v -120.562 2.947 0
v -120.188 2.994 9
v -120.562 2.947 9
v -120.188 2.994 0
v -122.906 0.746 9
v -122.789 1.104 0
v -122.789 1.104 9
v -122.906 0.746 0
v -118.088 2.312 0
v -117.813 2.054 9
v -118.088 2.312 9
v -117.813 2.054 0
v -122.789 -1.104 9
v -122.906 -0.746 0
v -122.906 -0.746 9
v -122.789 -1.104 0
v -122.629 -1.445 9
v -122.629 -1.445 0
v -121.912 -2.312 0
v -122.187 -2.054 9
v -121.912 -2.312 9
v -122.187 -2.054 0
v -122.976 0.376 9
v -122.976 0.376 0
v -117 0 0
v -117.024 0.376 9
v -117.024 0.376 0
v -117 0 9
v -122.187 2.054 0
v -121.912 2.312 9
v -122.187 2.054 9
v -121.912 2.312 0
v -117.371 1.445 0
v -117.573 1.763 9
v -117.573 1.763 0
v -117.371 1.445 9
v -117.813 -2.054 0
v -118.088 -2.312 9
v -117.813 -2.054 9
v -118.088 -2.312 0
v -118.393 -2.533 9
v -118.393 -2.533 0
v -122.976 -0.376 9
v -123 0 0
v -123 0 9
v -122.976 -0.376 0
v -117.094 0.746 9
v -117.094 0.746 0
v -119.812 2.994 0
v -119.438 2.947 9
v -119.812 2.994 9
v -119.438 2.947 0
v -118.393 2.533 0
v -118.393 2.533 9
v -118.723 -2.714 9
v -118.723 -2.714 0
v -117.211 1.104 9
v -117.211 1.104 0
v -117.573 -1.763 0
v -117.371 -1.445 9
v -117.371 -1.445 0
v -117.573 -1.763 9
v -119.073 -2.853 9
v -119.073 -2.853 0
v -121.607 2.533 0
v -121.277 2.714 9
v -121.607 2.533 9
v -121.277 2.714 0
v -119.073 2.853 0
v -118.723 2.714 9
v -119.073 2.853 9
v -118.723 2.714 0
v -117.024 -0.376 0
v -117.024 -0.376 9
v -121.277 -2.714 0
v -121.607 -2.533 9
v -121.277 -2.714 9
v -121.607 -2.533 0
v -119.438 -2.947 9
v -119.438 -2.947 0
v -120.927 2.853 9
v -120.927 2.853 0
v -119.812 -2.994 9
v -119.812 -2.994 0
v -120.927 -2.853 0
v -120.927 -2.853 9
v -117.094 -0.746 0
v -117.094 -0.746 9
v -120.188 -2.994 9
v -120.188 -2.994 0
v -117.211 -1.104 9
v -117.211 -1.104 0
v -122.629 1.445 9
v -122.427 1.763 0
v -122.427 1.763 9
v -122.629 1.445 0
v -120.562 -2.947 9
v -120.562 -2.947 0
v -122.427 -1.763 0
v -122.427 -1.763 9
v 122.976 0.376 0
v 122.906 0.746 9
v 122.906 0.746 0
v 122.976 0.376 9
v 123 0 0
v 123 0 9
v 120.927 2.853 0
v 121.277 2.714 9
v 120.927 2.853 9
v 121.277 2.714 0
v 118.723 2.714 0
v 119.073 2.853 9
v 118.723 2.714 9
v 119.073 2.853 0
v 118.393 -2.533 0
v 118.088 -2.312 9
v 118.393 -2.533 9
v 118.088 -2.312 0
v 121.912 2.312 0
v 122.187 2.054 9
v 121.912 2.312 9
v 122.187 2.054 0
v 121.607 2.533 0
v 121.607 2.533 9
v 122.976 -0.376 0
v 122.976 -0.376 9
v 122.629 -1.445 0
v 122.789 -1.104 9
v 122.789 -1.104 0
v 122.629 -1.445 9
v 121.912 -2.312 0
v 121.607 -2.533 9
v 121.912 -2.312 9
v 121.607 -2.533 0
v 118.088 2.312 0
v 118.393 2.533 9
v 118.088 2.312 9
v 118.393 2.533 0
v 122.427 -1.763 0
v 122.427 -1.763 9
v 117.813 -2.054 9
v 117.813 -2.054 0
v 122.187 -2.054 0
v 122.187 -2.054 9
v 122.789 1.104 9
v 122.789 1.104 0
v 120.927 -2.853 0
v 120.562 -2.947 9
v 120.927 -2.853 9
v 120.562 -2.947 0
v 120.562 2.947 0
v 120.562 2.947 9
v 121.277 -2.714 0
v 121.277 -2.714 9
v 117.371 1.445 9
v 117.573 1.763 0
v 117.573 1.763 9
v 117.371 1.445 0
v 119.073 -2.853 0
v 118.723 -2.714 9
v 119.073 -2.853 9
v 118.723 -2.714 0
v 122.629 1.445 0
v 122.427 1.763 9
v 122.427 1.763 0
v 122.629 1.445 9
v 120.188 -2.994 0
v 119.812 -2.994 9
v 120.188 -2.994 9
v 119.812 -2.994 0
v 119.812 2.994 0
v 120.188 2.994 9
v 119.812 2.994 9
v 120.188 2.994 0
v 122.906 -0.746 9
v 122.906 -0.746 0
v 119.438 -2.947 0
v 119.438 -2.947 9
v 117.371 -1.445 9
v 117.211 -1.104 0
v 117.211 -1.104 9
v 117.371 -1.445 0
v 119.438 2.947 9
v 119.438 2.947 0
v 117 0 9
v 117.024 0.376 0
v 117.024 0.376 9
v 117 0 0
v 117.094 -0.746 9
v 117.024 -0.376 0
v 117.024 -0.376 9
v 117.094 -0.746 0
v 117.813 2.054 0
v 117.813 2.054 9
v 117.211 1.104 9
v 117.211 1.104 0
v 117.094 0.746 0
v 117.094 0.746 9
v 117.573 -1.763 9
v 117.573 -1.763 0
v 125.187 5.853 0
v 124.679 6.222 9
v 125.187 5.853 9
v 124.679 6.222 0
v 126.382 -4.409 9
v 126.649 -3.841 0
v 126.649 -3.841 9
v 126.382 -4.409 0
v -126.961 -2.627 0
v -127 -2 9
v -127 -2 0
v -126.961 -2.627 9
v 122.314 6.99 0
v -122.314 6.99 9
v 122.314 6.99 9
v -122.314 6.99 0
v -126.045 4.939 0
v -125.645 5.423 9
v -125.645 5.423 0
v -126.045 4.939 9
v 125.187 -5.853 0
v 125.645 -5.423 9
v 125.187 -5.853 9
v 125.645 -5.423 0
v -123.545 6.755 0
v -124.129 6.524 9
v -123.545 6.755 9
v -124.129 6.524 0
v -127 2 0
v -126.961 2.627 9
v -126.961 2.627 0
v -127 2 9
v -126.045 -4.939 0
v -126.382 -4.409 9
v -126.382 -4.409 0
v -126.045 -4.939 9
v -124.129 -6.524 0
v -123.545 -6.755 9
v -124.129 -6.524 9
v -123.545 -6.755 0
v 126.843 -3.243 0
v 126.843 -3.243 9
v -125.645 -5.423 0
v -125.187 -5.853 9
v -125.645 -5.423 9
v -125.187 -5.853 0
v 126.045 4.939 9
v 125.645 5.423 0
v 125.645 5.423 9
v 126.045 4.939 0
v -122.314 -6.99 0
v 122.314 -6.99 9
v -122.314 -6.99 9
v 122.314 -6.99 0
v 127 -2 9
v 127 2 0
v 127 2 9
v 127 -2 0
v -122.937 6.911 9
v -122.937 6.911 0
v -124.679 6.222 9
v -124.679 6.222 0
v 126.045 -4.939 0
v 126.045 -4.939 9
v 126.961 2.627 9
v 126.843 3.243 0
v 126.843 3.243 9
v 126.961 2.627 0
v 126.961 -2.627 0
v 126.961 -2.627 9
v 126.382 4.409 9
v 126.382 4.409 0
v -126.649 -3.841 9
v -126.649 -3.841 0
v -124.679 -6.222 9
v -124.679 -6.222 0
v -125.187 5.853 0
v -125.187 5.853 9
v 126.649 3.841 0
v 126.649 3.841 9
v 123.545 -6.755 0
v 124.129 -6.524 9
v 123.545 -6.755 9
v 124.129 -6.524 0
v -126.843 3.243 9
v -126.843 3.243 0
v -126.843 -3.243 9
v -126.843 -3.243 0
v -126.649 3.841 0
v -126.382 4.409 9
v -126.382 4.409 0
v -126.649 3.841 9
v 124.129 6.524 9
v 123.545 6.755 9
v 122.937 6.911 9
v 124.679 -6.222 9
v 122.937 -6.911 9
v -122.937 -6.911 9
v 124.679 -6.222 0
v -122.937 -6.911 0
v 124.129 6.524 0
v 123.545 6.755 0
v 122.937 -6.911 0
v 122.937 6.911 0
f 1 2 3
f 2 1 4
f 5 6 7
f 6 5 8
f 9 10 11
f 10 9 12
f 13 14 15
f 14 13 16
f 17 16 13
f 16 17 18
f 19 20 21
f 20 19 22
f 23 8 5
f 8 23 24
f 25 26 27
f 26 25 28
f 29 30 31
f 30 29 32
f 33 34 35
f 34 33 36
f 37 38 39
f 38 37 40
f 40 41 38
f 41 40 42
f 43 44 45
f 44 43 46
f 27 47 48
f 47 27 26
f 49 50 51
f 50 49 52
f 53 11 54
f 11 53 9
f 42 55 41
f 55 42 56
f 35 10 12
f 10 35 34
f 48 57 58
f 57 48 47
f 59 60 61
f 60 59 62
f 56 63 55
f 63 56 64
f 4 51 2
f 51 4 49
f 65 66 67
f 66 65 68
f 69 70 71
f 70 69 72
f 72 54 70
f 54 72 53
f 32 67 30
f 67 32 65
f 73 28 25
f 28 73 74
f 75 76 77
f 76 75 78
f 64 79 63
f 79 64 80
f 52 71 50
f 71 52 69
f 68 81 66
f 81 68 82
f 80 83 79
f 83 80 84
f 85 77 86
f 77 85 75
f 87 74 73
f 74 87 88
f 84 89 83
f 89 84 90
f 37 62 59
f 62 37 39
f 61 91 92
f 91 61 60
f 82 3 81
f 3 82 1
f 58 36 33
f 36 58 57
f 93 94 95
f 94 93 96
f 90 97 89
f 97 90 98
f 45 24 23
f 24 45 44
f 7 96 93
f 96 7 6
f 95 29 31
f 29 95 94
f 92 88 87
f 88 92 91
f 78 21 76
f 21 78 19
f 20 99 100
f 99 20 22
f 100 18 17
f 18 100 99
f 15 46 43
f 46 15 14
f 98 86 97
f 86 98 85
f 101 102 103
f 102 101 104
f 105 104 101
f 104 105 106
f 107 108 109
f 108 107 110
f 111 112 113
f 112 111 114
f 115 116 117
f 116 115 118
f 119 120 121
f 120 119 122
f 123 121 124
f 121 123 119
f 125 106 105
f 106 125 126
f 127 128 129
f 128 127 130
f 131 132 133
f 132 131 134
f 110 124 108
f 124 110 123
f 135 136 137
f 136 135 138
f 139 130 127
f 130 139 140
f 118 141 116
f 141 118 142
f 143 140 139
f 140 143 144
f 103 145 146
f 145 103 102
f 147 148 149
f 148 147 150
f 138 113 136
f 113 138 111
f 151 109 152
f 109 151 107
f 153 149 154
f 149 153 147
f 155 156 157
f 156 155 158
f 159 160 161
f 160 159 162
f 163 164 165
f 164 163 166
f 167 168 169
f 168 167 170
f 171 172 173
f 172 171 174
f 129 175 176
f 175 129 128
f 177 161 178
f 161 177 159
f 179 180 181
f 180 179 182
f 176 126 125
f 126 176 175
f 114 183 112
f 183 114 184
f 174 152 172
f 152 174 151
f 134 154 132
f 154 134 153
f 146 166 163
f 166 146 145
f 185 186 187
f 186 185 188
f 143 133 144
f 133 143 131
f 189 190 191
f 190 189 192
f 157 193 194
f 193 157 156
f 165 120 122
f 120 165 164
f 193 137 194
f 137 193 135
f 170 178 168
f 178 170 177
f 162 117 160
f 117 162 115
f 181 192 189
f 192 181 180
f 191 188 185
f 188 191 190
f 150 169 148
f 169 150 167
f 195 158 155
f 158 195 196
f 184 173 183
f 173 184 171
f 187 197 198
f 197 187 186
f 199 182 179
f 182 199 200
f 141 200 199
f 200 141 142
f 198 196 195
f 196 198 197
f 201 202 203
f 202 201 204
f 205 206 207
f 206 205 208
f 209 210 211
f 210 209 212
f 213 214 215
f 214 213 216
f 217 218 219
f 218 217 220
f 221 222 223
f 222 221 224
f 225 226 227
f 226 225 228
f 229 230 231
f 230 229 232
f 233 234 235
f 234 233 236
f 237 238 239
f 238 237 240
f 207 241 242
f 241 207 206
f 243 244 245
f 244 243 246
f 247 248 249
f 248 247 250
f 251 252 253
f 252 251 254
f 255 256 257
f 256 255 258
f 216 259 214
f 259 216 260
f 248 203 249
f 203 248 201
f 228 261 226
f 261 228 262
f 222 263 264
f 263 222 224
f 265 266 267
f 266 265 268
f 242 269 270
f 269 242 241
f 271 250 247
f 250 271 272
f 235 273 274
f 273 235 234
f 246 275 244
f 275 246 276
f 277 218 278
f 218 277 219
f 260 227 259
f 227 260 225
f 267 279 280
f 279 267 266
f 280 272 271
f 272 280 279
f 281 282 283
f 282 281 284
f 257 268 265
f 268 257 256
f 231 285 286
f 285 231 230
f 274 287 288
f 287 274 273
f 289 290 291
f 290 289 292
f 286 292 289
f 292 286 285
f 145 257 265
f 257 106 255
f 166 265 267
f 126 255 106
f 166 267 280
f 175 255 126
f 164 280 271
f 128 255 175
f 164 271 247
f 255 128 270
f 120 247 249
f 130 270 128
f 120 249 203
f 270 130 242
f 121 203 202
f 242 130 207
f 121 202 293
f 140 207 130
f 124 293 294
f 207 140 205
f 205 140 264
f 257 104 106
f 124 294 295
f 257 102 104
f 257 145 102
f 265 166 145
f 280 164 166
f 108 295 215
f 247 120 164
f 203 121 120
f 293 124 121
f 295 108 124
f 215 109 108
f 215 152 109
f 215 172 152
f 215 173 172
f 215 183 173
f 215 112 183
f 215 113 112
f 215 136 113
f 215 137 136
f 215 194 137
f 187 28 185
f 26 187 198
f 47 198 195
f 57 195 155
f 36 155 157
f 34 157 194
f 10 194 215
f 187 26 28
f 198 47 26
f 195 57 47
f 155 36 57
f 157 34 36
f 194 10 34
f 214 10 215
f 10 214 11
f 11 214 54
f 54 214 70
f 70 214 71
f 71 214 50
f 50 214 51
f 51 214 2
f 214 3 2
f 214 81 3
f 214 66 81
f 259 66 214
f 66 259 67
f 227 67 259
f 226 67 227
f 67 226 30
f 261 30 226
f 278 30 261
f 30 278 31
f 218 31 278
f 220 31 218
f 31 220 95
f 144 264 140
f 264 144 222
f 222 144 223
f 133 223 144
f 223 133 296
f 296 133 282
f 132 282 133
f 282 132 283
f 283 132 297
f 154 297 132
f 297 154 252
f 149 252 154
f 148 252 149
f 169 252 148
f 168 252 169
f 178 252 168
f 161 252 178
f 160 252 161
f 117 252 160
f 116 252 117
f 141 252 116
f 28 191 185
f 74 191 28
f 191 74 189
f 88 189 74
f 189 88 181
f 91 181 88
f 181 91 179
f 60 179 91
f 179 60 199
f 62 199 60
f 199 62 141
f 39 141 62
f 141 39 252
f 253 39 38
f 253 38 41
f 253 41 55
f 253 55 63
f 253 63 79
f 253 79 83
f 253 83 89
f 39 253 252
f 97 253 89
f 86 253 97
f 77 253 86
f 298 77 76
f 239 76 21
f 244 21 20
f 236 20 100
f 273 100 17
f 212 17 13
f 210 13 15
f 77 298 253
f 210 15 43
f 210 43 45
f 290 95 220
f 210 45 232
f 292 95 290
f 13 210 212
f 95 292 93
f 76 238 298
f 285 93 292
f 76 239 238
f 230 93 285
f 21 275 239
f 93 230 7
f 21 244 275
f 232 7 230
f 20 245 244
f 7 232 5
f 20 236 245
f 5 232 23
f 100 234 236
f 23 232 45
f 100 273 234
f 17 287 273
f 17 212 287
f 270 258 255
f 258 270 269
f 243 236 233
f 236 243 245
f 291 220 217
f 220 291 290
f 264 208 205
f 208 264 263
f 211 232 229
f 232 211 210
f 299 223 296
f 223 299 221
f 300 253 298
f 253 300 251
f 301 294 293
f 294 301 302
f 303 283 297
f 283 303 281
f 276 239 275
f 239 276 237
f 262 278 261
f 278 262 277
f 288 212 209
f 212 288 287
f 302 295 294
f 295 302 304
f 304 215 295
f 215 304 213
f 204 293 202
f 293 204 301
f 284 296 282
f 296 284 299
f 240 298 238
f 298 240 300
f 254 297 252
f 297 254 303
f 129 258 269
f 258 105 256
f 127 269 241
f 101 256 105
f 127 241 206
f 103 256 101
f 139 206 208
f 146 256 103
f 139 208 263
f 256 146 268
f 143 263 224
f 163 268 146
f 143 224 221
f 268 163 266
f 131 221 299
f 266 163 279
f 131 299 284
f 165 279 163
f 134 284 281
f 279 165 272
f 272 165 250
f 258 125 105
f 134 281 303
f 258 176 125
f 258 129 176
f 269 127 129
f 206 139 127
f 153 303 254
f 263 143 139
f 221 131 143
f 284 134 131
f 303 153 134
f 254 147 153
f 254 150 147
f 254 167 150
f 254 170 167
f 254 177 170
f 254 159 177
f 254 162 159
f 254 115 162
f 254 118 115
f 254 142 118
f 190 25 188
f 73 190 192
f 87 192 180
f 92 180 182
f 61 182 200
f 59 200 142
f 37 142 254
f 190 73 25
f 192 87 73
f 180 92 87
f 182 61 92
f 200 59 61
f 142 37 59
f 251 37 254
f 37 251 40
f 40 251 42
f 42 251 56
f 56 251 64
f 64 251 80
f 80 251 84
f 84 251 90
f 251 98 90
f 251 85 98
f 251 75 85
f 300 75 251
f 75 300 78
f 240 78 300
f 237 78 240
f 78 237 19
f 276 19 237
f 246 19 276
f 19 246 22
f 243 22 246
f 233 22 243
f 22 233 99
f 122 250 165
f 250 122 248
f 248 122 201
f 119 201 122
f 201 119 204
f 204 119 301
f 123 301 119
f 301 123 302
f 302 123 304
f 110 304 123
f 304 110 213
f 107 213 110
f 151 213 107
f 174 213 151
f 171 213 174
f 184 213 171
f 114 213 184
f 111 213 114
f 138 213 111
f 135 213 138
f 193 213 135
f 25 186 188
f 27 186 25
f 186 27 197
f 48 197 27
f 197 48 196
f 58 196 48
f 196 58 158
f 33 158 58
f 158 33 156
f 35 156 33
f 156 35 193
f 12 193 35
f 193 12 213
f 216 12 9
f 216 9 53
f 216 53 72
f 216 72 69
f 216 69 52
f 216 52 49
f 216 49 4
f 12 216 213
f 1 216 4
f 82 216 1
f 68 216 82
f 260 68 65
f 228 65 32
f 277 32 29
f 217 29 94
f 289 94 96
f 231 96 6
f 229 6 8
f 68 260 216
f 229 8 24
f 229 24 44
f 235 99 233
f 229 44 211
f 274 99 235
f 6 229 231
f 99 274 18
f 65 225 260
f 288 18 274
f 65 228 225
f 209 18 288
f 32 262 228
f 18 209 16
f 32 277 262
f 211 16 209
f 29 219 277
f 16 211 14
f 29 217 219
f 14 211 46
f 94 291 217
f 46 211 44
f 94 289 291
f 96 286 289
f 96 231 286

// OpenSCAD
$fn = 50;


difference() {
	union() {
		hull() {
			translate(v = [-122.0000000000, 2.0000000000, 0]) {
				cylinder(h = 9, r = 5);
			}
			translate(v = [122.0000000000, 2.0000000000, 0]) {
				cylinder(h = 9, r = 5);
			}
			translate(v = [-122.0000000000, -2.0000000000, 0]) {
				cylinder(h = 9, r = 5);
			}
			translate(v = [122.0000000000, -2.0000000000, 0]) {
				cylinder(h = 9, r = 5);
			}
		}
	}
	union() {
		translate(v = [-120.0000000000, 0.0000000000, -100.0000000000]) {
			cylinder(h = 200, r = 3.0000000000);
		}
		translate(v = [-120.0000000000, 0.0000000000, -100.0000000000]) {
			cylinder(h = 200, r = 3.0000000000);
		}
		translate(v = [120.0000000000, 0.0000000000, -100.0000000000]) {
			cylinder(h = 200, r = 3.0000000000);
		}
		translate(v = [120.0000000000, 0.0000000000, -100.0000000000]) {
			cylinder(h = 200, r = 3.0000000000);
		}
	}
}
